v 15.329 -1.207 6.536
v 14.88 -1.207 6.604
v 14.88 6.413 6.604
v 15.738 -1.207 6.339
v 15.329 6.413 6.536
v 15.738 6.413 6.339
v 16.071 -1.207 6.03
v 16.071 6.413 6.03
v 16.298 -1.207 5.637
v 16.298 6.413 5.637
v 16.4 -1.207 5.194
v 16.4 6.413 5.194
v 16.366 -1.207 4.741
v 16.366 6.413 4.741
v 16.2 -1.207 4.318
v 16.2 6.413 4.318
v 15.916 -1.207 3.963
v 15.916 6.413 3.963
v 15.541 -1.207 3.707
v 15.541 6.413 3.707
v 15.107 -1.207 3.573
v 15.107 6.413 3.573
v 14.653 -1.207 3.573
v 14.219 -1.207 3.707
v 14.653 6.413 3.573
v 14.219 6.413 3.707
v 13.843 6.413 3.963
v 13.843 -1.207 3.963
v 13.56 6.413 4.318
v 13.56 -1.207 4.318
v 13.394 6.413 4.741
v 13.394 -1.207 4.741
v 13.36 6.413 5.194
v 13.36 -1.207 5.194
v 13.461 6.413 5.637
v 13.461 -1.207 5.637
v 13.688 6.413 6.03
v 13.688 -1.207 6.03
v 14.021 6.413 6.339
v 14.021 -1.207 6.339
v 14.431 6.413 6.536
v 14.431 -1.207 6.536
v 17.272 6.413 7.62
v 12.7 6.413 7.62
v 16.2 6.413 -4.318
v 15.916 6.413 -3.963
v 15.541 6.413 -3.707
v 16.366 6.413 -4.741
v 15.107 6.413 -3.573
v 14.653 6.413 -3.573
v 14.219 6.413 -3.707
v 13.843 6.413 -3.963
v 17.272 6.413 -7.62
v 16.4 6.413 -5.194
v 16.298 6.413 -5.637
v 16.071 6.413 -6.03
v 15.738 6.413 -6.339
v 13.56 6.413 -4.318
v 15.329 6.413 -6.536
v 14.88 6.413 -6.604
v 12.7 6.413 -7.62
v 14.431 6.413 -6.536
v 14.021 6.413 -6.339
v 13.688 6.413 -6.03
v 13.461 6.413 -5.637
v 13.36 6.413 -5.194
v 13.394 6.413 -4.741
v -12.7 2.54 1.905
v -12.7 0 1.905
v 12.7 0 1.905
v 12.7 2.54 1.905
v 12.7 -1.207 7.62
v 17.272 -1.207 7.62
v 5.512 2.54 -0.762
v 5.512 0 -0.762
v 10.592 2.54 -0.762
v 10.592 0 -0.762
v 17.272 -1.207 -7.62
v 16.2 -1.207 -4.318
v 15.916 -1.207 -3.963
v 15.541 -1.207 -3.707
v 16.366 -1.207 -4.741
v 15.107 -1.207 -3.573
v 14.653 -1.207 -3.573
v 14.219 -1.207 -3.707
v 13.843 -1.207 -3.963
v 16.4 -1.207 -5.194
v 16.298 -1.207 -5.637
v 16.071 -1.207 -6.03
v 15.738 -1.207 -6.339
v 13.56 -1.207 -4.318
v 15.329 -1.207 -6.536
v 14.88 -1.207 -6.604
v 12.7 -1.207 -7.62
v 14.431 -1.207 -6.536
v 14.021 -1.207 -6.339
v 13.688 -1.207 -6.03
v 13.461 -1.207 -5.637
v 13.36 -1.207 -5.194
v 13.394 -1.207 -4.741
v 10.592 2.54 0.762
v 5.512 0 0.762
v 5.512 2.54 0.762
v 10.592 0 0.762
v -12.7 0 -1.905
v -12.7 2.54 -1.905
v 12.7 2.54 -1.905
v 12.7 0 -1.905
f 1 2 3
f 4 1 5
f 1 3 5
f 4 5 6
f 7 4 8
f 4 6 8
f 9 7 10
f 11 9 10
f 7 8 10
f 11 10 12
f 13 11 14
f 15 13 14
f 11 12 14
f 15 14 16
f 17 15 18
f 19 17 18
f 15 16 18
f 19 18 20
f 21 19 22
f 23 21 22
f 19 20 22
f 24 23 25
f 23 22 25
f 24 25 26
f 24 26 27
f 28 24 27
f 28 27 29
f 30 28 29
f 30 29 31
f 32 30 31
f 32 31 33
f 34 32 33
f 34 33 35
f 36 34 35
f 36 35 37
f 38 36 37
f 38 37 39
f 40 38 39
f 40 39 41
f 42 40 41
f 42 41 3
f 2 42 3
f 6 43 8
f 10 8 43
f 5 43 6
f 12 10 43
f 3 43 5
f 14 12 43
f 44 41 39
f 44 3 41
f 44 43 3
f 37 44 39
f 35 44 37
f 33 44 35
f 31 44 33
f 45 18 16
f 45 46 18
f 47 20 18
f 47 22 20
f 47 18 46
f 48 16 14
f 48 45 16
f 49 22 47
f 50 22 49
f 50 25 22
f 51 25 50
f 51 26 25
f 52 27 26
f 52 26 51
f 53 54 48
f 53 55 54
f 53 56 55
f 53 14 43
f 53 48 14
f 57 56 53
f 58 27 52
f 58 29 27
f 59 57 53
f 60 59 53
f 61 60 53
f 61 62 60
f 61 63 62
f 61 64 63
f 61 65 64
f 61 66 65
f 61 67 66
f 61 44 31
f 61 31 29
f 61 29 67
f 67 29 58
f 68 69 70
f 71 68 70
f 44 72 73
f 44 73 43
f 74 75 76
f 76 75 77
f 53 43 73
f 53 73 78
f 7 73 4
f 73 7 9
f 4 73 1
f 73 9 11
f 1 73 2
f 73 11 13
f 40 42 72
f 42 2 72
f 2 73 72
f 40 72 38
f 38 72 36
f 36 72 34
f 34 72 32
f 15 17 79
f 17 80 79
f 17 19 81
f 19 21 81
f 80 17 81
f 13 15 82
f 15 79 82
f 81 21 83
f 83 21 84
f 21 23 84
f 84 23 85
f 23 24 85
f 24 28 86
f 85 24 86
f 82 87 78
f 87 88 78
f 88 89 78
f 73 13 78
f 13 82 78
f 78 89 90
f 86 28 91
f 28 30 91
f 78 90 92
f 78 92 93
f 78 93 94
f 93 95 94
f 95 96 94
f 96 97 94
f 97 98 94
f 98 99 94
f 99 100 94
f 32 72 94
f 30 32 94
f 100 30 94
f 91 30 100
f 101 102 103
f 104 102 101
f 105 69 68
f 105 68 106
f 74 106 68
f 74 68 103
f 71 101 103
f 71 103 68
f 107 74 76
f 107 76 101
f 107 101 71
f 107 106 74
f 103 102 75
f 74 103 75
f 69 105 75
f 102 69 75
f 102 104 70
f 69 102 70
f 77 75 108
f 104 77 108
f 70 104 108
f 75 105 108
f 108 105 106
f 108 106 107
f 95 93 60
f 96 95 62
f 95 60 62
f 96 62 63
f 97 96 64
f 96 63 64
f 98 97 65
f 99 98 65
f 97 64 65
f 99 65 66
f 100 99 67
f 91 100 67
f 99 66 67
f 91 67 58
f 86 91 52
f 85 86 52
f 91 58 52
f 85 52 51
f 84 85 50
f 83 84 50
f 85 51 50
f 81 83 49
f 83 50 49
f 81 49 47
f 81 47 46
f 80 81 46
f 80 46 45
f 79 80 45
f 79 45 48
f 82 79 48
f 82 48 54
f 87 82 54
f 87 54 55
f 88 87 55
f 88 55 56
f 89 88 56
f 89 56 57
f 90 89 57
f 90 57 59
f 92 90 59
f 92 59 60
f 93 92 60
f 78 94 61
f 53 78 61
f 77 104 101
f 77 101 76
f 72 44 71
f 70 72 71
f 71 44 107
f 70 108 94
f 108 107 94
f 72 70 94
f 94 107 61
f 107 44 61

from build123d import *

# Parameters (mm, degrees)
SKETCH1_W           = 25.4
SKETCH1_H           = 3.81
SKETCH1_W_2         = 5.08
SKETCH1_H_2         = 1.524
BOSS_EXTRUDE1_DEPTH = 2.54
SKETCH3_W           = 15.24
SKETCH3_H           = 7.62
BOSS_EXTRUDE2_DEPTH = 4.572
SKETCH4_R           = 1.524
CUT_EXTRUDE1_DEPTH  = 21.358064348


with BuildPart() as part:
    # Sketch1 → Boss-Extrude1 (new body)
    with BuildSketch(Plane(origin=(0, 0, 0), x_dir=(1, 0, 0), z_dir=(0, 1, 0))):
        Rectangle(SKETCH1_W, SKETCH1_H)
        with Locations((8.052340426, 0)):
            Rectangle(SKETCH1_W_2, SKETCH1_H_2, mode=Mode.SUBTRACT)
    extrude(amount=BOSS_EXTRUDE1_DEPTH)

    # Sketch3 → Boss-Extrude2 (add)
    with BuildSketch(Plane(origin=(12.7, 0, 0), x_dir=(0, 0, -1), z_dir=(1, 0, 0))):
        with Locations((0, 2.602908147)):
            Rectangle(SKETCH3_W, SKETCH3_H)
    extrude(amount=BOSS_EXTRUDE2_DEPTH)

    # Sketch4 → Cut-Extrude1 (cut, through all)
    with BuildSketch(Plane(origin=(0, 6.412908147, 0), x_dir=(1, 0, 0), z_dir=(0, 1, 0))):
        with Locations(Location((14.879777227, -5.08, 0), (0, 0, 270))):
            Circle(SKETCH4_R)
        with Locations(Location((14.879777227, 5.08, 0), (0, 0, 90))):
            Circle(SKETCH4_R)
    extrude(amount=-CUT_EXTRUDE1_DEPTH, mode=Mode.SUBTRACT)


solid = part.part
